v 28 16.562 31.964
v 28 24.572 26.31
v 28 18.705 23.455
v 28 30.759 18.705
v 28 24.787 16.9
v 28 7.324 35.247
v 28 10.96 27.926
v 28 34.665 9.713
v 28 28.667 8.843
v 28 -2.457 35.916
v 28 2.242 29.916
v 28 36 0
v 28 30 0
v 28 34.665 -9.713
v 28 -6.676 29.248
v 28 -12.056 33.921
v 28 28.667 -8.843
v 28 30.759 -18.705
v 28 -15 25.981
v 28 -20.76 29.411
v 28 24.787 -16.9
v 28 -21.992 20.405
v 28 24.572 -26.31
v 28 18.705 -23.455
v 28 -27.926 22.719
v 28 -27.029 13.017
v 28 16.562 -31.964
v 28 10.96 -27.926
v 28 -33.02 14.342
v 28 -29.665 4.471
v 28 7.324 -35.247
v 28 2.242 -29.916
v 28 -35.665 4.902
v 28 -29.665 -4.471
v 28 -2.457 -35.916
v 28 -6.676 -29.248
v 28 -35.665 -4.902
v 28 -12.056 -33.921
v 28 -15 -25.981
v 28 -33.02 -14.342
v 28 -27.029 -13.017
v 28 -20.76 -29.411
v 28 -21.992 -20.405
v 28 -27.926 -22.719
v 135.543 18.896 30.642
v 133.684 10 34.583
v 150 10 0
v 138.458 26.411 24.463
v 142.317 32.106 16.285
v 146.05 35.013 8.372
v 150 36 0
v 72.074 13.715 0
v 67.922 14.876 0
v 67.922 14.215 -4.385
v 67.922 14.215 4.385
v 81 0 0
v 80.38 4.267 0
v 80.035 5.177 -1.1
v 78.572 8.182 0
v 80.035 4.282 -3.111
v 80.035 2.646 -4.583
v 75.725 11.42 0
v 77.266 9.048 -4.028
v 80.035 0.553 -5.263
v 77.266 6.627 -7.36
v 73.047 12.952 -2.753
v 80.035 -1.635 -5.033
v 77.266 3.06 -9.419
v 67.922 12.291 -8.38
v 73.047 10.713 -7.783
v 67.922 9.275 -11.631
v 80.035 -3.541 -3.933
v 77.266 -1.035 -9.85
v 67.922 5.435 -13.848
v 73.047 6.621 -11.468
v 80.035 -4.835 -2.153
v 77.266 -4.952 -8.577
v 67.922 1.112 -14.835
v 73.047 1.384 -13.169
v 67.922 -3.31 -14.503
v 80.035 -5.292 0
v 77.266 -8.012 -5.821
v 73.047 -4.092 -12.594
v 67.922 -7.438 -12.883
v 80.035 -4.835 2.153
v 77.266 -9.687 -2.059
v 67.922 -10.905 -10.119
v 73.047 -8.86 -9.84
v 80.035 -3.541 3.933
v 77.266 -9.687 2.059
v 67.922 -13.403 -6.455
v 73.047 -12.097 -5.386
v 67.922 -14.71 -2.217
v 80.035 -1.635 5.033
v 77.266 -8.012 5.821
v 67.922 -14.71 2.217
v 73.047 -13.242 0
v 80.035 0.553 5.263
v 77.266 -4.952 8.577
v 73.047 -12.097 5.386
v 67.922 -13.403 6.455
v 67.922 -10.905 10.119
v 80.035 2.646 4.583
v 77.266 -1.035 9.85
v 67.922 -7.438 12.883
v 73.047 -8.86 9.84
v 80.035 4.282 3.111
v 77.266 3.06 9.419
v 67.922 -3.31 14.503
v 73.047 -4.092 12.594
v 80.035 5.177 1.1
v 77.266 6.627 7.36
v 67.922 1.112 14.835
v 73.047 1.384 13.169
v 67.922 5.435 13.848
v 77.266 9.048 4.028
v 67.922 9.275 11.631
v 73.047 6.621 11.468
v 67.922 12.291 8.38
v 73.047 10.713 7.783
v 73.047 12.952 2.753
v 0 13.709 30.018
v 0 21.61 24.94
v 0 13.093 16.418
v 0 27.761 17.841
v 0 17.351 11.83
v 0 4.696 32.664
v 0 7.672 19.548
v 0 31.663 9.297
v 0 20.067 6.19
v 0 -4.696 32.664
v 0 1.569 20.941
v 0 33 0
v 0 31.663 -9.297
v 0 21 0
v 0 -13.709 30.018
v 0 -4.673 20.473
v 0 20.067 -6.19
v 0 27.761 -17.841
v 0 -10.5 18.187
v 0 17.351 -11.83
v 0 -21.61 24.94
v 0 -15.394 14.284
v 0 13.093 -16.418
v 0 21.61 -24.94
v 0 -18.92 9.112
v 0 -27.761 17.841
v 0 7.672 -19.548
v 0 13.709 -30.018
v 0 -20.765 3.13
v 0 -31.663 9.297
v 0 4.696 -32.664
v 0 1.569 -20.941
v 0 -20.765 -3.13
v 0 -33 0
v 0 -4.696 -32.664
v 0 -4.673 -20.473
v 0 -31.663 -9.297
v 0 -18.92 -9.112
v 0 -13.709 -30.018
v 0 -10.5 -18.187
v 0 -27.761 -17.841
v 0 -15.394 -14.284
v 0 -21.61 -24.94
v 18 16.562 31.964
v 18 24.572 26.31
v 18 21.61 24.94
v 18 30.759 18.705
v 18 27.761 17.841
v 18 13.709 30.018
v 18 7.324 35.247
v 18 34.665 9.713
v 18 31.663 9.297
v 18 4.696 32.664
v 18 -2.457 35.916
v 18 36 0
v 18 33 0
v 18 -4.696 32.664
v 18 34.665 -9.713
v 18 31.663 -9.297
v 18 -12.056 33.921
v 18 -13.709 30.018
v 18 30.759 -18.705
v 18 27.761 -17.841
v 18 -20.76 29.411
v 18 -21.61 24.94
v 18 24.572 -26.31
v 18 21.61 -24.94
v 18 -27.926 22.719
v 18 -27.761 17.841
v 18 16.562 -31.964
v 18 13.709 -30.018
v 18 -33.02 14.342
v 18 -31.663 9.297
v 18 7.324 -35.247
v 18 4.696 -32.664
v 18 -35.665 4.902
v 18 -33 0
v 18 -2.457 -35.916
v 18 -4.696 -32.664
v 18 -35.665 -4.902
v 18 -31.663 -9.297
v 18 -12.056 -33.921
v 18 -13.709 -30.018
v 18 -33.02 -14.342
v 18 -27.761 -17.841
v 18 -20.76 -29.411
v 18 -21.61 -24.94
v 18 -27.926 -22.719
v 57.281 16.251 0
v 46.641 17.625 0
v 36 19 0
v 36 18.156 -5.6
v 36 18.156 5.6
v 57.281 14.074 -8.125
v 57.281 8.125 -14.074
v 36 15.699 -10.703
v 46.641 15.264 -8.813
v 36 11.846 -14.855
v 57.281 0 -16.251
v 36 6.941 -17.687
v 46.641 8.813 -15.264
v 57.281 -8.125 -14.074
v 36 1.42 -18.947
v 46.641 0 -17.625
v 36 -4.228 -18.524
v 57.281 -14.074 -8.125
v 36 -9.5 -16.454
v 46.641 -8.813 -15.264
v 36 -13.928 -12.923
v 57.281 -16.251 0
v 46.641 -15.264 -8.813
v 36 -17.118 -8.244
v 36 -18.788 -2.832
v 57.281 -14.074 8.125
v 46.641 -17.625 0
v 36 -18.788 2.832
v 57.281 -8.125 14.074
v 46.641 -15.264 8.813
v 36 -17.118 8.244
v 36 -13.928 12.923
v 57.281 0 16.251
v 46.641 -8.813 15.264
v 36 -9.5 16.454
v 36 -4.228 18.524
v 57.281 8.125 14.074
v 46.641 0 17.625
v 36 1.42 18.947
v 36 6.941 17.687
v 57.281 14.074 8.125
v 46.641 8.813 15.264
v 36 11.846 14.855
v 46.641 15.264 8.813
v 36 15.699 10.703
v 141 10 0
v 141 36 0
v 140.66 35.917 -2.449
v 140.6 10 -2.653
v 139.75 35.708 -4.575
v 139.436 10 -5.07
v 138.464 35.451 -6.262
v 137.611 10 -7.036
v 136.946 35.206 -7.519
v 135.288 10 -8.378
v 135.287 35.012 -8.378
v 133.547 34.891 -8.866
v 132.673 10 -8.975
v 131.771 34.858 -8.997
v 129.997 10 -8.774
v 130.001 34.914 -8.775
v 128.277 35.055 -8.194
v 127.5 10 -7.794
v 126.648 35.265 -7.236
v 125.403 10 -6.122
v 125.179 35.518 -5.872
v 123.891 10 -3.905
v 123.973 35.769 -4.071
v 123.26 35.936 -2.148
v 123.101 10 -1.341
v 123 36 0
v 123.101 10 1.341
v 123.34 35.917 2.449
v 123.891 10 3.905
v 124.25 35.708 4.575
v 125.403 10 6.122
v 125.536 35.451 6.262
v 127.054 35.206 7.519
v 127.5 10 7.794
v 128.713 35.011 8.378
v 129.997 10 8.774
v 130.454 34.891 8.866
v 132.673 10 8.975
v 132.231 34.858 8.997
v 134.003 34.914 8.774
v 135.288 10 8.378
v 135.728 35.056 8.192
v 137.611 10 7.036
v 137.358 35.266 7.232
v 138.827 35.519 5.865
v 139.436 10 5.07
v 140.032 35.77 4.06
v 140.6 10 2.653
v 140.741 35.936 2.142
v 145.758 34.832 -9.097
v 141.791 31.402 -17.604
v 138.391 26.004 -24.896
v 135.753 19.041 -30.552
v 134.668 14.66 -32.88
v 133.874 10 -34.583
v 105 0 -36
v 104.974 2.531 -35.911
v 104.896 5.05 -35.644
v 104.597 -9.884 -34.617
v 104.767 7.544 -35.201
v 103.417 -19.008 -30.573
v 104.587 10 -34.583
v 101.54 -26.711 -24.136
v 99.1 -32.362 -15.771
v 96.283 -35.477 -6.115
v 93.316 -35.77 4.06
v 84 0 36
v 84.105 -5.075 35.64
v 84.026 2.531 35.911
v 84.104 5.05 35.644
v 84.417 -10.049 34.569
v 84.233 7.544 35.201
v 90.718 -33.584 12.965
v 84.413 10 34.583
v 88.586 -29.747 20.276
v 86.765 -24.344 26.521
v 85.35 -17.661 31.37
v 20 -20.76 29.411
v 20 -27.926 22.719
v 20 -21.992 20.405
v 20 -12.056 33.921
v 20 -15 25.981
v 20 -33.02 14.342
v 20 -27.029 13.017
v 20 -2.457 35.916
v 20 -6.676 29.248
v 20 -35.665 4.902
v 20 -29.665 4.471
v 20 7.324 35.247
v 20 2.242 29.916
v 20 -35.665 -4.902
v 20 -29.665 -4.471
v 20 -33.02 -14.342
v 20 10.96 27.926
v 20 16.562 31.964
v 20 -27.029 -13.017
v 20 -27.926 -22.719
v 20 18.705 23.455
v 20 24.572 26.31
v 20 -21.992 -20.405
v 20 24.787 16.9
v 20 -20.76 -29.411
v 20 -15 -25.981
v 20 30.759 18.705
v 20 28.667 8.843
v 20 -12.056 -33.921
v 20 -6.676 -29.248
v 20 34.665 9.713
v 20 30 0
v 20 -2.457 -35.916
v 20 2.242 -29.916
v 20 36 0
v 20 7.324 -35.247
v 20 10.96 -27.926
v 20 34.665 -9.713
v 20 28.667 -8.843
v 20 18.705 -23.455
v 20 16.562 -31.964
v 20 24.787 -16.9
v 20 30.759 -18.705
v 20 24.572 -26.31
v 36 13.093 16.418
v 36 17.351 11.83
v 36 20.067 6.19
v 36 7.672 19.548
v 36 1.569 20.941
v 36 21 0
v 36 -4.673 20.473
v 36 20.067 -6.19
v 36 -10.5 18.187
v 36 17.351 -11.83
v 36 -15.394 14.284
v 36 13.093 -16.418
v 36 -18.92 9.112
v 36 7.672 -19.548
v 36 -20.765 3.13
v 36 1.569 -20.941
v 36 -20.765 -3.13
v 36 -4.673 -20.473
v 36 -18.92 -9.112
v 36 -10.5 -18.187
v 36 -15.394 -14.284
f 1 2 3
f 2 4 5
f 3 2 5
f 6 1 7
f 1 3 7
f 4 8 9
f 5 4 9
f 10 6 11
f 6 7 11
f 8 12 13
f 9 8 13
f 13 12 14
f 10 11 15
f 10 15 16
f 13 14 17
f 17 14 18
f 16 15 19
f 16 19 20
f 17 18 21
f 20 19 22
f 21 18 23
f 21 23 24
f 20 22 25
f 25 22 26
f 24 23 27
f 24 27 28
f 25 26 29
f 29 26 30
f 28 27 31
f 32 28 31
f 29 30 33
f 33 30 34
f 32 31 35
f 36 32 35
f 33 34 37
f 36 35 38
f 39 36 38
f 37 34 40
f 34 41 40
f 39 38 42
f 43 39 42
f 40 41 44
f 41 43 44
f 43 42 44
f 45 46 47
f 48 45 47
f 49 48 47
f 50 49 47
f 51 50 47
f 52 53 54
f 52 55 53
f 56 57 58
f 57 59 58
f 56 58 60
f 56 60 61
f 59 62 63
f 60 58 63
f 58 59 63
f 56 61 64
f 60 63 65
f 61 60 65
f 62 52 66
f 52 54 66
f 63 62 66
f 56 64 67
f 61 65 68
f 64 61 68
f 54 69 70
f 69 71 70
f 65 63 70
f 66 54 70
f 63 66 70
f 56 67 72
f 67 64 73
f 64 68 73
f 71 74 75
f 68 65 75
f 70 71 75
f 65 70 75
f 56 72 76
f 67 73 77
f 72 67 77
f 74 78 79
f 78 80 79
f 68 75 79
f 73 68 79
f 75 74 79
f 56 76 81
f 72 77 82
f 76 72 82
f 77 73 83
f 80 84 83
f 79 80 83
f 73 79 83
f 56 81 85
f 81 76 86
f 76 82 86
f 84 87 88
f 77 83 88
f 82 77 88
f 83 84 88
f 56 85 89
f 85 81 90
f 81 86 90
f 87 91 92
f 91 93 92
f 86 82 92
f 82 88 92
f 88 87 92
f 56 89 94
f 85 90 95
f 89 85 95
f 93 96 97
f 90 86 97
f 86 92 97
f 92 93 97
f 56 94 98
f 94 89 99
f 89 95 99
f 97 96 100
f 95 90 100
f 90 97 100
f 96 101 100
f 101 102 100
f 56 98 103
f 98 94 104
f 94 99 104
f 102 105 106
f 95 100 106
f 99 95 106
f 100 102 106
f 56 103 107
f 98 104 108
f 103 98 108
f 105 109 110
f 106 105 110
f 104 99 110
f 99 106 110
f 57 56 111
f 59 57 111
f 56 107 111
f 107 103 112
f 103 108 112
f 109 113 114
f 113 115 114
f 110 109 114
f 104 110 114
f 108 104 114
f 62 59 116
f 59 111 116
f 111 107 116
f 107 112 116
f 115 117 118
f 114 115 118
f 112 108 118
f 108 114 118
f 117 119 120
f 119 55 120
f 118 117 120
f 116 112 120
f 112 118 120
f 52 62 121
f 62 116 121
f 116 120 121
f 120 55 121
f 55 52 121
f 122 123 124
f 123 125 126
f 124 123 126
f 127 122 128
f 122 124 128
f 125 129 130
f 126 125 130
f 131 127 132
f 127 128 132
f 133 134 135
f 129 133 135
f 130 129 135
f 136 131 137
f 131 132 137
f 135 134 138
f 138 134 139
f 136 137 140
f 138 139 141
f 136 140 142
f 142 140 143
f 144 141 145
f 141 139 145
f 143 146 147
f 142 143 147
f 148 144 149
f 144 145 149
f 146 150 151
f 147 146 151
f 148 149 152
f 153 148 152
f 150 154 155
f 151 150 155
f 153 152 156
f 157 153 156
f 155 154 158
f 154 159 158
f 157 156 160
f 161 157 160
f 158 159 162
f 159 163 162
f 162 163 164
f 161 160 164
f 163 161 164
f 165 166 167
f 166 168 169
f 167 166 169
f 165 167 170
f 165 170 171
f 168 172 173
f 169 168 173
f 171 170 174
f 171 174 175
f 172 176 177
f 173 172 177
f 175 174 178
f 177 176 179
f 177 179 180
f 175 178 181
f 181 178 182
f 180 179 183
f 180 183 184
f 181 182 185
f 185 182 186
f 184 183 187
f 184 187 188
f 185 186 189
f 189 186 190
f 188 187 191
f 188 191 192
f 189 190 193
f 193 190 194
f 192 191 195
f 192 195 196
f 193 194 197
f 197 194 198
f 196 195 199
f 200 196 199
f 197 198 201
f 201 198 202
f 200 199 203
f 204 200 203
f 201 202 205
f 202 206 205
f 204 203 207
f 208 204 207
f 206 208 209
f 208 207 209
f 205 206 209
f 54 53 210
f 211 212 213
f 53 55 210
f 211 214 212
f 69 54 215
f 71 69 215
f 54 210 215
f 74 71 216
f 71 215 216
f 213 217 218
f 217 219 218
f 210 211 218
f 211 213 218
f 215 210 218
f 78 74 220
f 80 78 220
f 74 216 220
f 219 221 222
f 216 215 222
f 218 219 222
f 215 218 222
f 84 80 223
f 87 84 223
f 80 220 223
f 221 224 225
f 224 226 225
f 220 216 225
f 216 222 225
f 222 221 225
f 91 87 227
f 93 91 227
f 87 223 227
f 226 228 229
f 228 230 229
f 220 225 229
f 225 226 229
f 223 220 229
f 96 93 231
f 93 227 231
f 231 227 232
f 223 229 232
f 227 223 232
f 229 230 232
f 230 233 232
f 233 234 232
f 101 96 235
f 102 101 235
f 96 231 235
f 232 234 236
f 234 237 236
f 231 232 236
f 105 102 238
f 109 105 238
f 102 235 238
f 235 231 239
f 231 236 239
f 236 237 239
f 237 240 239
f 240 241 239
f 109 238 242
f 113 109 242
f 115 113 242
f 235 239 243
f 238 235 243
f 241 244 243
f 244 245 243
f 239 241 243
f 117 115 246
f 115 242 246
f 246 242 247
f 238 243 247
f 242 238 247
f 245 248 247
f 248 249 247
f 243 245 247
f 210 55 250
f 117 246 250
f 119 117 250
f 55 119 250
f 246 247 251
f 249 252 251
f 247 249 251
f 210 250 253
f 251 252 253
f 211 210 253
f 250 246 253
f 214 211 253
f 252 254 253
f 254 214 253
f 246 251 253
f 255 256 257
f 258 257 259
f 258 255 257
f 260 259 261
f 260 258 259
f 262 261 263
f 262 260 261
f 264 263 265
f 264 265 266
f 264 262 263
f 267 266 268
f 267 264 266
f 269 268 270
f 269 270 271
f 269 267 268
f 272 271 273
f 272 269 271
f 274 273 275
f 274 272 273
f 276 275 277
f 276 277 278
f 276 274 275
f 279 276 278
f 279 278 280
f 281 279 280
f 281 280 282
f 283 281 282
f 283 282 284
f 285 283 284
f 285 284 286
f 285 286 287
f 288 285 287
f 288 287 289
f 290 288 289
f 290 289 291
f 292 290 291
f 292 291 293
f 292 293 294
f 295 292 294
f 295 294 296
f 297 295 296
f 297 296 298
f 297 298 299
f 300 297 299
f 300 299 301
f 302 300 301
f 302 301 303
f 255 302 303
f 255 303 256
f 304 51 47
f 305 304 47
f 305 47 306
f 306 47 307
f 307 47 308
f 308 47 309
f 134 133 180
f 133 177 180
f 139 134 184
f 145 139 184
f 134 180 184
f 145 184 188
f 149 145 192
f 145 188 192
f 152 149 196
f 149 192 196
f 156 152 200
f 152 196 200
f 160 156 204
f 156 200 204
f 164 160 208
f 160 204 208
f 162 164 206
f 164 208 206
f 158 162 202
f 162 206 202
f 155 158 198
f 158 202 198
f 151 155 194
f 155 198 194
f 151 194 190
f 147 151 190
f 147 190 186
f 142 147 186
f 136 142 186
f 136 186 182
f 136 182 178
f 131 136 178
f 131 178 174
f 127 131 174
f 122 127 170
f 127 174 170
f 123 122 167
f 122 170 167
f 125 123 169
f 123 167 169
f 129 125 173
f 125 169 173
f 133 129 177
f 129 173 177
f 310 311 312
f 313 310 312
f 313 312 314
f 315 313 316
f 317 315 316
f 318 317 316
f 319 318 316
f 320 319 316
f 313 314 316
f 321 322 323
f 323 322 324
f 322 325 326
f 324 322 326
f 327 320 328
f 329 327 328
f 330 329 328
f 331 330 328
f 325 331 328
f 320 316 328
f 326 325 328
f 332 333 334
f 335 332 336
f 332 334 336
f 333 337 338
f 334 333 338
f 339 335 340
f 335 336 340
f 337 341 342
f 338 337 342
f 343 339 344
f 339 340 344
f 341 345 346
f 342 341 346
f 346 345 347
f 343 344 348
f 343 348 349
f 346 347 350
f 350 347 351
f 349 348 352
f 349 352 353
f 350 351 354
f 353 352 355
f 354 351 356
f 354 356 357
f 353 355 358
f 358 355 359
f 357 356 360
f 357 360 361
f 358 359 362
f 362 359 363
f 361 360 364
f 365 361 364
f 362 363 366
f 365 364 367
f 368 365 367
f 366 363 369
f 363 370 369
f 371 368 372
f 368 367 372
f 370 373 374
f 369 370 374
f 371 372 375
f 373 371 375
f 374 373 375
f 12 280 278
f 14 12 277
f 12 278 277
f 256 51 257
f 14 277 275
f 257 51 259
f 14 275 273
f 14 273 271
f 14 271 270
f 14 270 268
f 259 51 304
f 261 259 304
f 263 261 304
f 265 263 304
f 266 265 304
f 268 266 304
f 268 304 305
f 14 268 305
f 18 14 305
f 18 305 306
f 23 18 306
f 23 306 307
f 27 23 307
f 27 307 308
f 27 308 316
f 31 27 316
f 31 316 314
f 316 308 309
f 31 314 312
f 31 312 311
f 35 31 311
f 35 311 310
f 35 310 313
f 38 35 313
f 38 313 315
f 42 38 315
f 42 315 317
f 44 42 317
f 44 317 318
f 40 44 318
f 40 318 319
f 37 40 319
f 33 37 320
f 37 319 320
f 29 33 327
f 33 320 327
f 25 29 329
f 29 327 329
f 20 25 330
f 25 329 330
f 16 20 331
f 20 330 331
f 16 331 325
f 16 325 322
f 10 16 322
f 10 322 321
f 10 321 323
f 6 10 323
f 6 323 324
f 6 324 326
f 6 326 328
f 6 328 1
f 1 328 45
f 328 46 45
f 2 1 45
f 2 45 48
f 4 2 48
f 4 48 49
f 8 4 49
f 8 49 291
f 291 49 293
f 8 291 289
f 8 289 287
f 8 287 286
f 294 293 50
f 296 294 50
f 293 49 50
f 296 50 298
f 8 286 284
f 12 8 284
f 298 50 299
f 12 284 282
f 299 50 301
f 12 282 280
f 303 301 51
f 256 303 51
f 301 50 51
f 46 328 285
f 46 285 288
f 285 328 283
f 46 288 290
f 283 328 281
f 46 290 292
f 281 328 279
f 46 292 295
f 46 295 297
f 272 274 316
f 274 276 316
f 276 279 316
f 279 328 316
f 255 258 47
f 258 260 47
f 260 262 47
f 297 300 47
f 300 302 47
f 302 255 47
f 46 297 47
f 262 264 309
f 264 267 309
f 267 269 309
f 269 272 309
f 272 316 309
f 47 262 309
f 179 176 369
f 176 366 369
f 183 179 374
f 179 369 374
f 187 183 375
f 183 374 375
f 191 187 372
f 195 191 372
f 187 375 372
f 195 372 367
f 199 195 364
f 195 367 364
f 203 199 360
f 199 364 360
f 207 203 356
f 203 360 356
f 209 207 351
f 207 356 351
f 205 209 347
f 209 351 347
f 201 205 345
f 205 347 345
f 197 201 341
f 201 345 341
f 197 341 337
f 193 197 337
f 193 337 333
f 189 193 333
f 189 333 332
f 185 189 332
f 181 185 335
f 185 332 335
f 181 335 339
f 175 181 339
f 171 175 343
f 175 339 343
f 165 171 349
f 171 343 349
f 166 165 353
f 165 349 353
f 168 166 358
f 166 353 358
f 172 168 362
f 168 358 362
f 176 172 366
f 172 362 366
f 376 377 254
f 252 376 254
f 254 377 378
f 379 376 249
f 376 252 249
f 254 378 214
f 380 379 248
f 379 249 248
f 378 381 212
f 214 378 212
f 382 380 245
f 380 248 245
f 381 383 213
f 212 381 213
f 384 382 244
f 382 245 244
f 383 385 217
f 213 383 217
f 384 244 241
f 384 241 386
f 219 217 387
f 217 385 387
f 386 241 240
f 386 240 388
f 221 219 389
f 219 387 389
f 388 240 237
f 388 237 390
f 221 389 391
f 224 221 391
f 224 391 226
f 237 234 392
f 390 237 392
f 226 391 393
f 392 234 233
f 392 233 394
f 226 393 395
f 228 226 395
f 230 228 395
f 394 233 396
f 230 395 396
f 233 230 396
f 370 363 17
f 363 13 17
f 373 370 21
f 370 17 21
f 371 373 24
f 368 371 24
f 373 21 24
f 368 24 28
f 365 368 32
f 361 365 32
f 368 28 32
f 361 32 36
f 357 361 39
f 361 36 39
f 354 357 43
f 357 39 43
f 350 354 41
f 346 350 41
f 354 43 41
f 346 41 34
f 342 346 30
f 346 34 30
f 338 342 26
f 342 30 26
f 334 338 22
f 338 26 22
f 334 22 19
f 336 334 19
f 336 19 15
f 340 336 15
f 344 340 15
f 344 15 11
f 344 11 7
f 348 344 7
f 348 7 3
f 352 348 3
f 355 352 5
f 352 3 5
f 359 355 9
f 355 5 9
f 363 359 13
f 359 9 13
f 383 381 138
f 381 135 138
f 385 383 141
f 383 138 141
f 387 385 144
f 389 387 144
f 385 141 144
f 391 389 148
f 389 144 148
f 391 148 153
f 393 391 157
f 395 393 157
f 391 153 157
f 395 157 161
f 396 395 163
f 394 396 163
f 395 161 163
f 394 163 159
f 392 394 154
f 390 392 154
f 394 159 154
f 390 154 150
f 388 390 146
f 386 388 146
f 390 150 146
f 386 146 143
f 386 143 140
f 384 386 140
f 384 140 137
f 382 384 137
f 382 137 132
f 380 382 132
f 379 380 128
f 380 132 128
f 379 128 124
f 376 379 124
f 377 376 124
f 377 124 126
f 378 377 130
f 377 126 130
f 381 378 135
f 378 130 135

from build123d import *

# Parameters (mm, degrees)
ENL_V_MAT_EXTRU_3_DEPTH = 161.972047263
ESQUISSE8_R             = 9
ENL_V_MAT_EXTRU_4_DEPTH = 161.972047263


with BuildPart() as part:
    # Esquisse6 → Révolution1 (revolve)
    with BuildSketch(Plane.XY):
        with BuildLine():
            Line((0, 21), (0, 33))
            Line((0, 33), (18, 33))
            Line((18, 33), (18, 36))
            Line((18, 36), (20, 36))
            Line((20, 36), (20, 30))
            Line((20, 30), (28, 30))
            Line((28, 30), (28, 36))
            Line((28, 36), (150, 36))
            Line((150, 36), (150, 0))
            Line((150, 0), (80.999999995, 0))
            ThreePointArc((80.999999995, 0), (77.265560701, 9.903895293), (67.921714398, 14.876391154))
            Line((67.921714398, 14.876391154), (36, 19))
            Line((36, 19), (36, 21))
            Line((36, 21), (0, 21))
        make_face()
    revolve(axis=Axis((150, 0, 0), (-1, 0, 0)))

    # Esquisse7 → Enlèv. mat.-Extru.3 (cut, through all)
    with BuildSketch(Plane(origin=(0, 10, 0), x_dir=(1, 0, 0), z_dir=(0, 1, 0))):
        Polygon((105, 36), (84, -36), (150, -36), (150, 36), align=None)
    extrude(amount=-ENL_V_MAT_EXTRU_3_DEPTH, mode=Mode.SUBTRACT)

    # Esquisse8 → Enlèv. mat.-Extru.4 (cut, through all)
    with BuildSketch(Plane(origin=(0, 10, 0), x_dir=(-1, 0, 0), z_dir=(0, 1, 0))):
        with Locations(Location((-132, 0, 0), (0, 0, 180))):
            Circle(ESQUISSE8_R)
        Polygon((-130.288986923, -42.270403954), (-160.663521038, -42.270403954), (-160.663521038, 48.483793559), (-127.12534153, 48.483793559), (-150, 0), align=None)
    extrude(amount=ENL_V_MAT_EXTRU_4_DEPTH, mode=Mode.SUBTRACT)


solid = part.part
